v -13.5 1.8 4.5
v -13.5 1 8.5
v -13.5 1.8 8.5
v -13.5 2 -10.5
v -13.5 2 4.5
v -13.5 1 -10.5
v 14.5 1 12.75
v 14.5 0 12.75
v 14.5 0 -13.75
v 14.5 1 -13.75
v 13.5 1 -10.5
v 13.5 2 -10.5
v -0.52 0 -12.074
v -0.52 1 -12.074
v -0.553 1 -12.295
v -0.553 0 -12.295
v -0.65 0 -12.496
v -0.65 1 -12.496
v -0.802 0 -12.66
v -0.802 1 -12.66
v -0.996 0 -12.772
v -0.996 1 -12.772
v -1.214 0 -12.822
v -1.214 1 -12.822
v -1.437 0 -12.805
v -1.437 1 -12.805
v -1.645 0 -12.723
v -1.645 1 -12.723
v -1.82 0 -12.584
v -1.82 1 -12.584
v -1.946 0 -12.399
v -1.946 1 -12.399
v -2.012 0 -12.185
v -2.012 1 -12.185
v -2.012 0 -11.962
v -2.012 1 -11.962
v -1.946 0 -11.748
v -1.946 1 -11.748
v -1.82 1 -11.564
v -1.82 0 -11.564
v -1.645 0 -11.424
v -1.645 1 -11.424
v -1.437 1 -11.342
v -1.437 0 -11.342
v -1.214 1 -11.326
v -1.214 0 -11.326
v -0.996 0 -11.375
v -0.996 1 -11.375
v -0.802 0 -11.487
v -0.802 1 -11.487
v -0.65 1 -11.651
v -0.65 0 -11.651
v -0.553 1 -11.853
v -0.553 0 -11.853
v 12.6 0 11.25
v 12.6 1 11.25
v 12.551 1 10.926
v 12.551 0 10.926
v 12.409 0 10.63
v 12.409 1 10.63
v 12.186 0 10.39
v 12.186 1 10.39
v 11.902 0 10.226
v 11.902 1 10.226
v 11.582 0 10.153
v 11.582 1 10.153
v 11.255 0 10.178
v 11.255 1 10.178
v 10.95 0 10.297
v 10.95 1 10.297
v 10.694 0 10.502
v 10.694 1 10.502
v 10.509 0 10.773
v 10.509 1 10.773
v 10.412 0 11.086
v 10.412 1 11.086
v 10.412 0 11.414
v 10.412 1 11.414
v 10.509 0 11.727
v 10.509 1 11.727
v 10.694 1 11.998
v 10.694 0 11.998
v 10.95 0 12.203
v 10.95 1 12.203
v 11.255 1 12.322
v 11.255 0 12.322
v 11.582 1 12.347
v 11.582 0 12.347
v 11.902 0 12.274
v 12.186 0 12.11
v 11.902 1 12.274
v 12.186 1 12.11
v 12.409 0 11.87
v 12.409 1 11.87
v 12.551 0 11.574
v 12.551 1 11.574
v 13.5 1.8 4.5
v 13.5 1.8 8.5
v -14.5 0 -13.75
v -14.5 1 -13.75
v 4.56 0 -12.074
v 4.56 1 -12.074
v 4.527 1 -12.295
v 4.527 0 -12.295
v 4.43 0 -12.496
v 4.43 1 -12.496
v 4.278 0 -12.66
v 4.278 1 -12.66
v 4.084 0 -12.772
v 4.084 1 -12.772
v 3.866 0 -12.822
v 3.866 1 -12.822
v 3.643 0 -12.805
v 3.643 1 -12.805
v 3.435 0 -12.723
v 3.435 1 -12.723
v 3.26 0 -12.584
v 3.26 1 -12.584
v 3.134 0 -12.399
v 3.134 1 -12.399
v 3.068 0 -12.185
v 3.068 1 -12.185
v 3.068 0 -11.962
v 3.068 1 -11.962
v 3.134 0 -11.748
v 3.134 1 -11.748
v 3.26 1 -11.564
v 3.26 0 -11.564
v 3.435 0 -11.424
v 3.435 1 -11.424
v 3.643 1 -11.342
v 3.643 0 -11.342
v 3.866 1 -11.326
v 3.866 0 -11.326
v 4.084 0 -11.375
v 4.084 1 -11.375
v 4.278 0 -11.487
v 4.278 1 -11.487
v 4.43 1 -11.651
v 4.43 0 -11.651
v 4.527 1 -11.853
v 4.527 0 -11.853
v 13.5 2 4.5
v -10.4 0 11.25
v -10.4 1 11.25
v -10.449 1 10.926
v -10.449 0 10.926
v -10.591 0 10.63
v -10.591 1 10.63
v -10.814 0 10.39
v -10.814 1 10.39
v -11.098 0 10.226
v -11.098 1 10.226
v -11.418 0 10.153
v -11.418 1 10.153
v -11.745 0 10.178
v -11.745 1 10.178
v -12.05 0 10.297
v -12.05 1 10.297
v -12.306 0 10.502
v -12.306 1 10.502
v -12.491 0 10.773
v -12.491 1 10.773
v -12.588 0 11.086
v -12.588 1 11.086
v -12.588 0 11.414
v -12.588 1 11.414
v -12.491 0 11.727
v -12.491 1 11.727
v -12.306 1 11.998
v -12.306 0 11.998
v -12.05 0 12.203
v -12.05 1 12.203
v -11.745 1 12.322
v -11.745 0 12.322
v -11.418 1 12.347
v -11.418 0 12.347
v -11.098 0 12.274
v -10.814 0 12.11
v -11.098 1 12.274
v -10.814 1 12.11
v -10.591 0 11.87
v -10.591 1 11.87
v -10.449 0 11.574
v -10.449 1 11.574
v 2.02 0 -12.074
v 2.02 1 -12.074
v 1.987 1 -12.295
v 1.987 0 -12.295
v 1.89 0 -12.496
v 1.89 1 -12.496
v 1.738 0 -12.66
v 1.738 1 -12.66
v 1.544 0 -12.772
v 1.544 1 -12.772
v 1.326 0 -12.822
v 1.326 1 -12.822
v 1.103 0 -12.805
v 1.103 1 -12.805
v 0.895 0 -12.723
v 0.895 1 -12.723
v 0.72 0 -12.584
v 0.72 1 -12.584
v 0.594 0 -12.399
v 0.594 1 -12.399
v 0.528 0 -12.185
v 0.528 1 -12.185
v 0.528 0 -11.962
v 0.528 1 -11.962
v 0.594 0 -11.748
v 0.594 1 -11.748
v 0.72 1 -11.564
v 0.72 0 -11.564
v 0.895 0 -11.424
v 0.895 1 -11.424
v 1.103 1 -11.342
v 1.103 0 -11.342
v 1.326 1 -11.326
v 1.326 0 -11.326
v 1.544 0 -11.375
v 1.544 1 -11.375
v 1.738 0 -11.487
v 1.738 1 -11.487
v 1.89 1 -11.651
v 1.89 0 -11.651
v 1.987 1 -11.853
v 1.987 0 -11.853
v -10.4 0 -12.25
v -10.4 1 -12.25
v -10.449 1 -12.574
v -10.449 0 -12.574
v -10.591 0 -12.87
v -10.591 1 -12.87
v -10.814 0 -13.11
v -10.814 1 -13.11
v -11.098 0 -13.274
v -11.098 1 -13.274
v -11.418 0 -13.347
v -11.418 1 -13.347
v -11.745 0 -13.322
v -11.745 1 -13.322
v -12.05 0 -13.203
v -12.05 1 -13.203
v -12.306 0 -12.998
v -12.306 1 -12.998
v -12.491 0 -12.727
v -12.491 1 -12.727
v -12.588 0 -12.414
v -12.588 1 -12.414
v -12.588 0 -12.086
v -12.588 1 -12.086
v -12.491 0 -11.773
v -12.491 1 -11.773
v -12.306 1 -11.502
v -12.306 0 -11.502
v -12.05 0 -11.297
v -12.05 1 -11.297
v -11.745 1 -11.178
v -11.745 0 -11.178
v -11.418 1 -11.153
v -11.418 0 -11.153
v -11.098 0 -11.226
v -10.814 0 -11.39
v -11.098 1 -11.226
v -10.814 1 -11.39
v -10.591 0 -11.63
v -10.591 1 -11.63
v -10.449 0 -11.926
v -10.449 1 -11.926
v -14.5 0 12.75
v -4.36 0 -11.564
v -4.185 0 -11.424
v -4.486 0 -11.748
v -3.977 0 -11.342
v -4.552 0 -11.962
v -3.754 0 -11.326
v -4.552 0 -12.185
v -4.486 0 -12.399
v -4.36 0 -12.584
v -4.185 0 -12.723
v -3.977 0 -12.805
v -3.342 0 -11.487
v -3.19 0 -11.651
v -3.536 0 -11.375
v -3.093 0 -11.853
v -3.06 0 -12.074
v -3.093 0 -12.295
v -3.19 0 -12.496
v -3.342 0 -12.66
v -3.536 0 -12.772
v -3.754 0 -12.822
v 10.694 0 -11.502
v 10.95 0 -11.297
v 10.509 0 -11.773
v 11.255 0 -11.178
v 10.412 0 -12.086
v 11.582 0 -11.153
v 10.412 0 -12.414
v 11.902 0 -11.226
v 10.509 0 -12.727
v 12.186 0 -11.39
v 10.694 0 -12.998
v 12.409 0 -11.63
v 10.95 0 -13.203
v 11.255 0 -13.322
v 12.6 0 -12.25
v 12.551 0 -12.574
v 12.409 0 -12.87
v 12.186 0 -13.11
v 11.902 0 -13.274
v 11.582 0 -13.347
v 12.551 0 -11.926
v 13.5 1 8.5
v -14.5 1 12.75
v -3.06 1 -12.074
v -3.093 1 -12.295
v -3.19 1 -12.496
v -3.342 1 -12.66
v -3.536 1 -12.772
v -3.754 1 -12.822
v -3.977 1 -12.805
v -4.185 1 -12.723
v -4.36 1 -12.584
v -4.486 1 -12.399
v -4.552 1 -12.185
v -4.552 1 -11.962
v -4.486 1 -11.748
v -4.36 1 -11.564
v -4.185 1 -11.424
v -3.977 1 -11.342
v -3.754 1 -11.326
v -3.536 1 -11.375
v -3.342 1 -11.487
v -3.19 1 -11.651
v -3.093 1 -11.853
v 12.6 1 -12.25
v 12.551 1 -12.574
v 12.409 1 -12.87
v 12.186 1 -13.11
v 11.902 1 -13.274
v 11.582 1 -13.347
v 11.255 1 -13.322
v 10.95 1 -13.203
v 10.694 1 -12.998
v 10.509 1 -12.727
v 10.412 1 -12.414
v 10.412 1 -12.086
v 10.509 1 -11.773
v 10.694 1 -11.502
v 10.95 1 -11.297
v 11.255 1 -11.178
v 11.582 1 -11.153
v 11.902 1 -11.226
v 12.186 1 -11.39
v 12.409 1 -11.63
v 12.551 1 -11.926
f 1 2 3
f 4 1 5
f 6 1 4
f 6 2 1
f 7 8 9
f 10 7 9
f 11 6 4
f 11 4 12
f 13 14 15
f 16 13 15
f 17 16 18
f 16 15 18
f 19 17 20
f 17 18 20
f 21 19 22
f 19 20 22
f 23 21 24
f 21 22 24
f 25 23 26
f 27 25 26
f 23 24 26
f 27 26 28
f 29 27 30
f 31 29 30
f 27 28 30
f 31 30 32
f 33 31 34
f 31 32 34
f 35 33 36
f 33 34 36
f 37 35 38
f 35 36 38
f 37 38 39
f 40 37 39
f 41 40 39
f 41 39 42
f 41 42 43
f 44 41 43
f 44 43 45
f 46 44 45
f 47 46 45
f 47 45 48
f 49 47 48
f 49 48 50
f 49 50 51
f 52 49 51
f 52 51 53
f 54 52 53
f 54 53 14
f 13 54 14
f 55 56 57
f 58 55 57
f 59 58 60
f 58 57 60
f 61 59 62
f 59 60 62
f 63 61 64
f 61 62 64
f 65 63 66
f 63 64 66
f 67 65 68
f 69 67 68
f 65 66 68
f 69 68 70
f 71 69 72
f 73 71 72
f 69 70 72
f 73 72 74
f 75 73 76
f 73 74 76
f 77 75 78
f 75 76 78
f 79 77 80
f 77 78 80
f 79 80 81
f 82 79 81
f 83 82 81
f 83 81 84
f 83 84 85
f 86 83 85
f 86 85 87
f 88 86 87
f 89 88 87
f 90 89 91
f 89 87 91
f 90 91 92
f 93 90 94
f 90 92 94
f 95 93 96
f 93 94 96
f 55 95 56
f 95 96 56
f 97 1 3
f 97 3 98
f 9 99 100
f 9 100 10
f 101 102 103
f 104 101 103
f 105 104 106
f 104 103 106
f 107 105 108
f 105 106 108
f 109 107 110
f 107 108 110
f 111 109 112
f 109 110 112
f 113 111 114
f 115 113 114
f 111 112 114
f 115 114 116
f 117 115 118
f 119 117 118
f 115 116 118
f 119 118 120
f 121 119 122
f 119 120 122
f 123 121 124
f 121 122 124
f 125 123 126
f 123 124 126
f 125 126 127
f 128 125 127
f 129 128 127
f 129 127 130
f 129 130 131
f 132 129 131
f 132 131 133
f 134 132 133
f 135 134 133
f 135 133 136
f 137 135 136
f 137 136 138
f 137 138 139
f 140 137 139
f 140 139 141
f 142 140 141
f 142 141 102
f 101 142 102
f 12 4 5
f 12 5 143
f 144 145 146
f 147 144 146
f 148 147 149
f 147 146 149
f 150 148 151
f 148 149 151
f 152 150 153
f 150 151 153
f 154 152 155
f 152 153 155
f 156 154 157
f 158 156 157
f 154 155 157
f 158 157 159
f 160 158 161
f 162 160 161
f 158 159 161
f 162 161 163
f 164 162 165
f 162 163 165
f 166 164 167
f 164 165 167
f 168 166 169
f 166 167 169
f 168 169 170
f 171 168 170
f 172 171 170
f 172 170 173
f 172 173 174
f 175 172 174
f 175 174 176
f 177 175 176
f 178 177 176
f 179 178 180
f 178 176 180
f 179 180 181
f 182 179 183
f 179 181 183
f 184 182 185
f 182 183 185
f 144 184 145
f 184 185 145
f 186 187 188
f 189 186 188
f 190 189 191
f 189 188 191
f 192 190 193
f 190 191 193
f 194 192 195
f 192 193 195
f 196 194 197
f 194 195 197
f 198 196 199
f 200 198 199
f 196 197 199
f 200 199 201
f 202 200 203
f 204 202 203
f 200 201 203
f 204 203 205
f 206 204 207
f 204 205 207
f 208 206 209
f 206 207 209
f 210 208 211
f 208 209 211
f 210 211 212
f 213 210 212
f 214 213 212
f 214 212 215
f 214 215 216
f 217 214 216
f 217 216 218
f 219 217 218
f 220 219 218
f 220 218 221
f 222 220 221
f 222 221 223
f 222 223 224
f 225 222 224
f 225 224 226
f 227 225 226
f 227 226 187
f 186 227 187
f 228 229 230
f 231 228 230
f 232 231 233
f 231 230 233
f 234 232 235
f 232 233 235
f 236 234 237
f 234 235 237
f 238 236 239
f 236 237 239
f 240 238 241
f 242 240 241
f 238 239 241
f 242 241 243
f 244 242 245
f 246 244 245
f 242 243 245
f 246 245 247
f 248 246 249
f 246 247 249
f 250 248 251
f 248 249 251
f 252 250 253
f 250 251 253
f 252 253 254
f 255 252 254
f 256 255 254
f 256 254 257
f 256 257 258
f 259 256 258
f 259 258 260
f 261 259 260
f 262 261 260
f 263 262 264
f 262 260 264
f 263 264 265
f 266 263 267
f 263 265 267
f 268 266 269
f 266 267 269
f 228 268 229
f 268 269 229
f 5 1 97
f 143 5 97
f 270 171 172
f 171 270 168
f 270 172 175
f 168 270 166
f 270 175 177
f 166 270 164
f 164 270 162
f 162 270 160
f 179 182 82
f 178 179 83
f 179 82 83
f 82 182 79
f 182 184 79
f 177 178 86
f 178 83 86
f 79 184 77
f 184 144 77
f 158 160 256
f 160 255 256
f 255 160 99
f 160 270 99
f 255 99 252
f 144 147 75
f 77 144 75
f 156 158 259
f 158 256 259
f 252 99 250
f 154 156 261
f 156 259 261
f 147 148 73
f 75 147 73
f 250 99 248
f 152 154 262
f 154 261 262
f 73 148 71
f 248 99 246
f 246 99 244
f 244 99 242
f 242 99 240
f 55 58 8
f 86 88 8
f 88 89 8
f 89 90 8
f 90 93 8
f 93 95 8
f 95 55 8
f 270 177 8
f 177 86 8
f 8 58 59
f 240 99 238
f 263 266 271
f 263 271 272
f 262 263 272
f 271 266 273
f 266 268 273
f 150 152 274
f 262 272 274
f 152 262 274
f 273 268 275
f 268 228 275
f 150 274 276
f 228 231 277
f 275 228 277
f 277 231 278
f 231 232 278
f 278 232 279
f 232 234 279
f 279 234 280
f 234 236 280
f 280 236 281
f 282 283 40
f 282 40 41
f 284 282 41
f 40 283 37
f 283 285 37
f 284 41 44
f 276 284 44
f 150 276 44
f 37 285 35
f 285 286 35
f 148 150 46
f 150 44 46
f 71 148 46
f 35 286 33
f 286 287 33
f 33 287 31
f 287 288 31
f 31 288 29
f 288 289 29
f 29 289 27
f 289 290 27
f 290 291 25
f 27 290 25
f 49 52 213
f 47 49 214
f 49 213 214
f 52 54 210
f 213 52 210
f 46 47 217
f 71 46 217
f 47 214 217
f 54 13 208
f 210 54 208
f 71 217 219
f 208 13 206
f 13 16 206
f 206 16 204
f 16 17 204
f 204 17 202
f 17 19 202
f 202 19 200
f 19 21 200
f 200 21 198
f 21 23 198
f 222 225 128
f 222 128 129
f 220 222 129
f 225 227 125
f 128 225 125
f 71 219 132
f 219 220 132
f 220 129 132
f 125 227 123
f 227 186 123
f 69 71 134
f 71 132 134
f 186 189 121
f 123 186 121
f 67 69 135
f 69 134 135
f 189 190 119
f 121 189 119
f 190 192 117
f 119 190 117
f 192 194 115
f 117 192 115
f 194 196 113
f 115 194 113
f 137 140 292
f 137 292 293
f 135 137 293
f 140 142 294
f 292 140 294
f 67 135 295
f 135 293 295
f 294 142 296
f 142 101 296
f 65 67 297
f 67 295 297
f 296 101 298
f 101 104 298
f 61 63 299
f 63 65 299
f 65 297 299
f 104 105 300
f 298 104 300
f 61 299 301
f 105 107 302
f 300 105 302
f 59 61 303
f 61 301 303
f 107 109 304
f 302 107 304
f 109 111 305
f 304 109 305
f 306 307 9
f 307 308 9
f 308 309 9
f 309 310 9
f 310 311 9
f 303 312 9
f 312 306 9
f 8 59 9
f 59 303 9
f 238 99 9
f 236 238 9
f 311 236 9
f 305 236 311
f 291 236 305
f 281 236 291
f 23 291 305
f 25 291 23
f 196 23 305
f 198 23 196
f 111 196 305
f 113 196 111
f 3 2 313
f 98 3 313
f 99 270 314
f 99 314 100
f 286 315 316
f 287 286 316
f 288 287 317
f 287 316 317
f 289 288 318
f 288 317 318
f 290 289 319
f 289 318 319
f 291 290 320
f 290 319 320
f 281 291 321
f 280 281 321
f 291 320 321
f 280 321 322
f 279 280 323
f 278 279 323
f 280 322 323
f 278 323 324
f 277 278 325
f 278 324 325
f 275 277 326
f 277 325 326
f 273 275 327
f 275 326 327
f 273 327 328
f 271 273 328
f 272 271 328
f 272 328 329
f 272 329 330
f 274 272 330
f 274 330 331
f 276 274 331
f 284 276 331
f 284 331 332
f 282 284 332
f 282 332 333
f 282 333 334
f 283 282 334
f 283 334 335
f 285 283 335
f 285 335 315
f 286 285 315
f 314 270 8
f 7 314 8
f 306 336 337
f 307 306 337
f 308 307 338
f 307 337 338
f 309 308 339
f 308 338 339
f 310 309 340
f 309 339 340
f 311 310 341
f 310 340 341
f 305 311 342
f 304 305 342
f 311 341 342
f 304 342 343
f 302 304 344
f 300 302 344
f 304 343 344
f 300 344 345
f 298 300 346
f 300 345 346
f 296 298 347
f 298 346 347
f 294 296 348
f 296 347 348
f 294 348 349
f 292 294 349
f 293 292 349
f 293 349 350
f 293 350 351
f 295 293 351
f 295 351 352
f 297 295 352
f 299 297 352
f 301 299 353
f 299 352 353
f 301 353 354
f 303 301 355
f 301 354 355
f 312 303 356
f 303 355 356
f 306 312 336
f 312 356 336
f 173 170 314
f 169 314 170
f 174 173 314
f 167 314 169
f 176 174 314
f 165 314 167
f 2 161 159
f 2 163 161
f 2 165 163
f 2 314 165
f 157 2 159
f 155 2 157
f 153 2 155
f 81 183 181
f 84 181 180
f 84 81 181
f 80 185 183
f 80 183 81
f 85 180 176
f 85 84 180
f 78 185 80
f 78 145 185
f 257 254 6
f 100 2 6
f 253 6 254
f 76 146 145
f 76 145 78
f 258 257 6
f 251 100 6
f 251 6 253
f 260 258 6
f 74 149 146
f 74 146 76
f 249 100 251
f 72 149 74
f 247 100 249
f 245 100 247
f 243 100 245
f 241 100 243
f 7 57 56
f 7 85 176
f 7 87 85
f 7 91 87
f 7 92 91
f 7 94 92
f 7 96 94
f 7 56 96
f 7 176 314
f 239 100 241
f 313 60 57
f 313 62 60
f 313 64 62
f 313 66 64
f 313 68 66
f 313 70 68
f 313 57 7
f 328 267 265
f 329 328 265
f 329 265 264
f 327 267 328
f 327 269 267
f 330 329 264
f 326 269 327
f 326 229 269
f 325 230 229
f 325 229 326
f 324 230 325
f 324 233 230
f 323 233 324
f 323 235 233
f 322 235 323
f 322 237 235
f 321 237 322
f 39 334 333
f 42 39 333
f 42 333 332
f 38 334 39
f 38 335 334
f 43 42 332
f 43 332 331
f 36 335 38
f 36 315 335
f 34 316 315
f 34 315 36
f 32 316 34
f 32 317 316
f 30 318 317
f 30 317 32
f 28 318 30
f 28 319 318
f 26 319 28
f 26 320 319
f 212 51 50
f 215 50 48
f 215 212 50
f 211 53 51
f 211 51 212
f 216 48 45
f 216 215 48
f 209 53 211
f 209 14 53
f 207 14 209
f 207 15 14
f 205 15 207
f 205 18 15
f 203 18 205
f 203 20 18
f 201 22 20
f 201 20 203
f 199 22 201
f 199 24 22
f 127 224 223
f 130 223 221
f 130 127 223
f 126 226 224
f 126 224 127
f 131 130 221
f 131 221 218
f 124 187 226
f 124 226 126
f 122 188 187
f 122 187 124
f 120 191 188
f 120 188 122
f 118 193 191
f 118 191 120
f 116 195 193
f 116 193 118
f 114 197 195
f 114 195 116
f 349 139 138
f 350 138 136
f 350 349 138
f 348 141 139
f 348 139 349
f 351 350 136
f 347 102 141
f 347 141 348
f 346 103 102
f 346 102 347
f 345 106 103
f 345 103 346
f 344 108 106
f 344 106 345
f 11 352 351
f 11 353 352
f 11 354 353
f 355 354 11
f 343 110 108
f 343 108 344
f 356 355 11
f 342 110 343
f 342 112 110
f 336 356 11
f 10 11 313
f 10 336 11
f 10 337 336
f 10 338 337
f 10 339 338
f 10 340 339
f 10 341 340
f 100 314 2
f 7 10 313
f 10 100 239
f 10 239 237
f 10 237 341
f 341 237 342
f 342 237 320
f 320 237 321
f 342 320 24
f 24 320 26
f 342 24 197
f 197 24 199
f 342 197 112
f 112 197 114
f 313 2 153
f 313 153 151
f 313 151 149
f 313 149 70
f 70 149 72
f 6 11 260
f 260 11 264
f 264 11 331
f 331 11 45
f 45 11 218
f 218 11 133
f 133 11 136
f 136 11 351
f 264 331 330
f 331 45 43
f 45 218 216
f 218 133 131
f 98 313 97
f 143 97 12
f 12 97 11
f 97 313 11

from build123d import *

# Parameters (mm, degrees)
SKETCH1_W           = 29
SKETCH1_H           = 26.5
BOSS_EXTRUDE1_DEPTH = 1
SKETCH2_R           = 1.1
CUT_EXTRUDE1_DEPTH  = 1
SKETCH3_W           = 27
SKETCH3_H           = 15
BOSS_EXTRUDE2_DEPTH = 1
SKETCH4_W           = 27
SKETCH4_H           = 19
BOSS_EXTRUDE3_DEPTH = 0.8
SKETCH5_R           = 0.75
CUT_EXTRUDE2_DEPTH  = 10.8


with BuildPart() as part:
    # Sketch1 → Boss-Extrude1 (new body)
    with BuildSketch(Plane(origin=(0, 0, 0), x_dir=(1, 0, 0), z_dir=(0, 1, 0))):
        with Locations((0, 0.5)):
            Rectangle(SKETCH1_W, SKETCH1_H)
    extrude(amount=BOSS_EXTRUDE1_DEPTH)

    # Sketch2 → Cut-Extrude1 (cut)
    with BuildSketch(Plane(origin=(0, 1, 0), x_dir=(1, 0, 0), z_dir=(0, 1, 0))):
        with Locations((-11.5, 12.25)):
            Circle(SKETCH2_R)
        with Locations((11.5, 12.25)):
            Circle(SKETCH2_R)
        with Locations((-11.5, -11.25)):
            Circle(SKETCH2_R)
        with Locations((11.5, -11.25)):
            Circle(SKETCH2_R)
    extrude(amount=-CUT_EXTRUDE1_DEPTH, mode=Mode.SUBTRACT)

    # Sketch3 → Boss-Extrude2 (add)
    with BuildSketch(Plane(origin=(0, 1, 0), x_dir=(1, 0, 0), z_dir=(0, 1, 0))):
        with Locations((0, 3)):
            Rectangle(SKETCH3_W, SKETCH3_H)
    extrude(amount=BOSS_EXTRUDE2_DEPTH)

    # Sketch4 → Boss-Extrude3 (add)
    with BuildSketch(Plane(origin=(0, 1, 0), x_dir=(1, 0, 0), z_dir=(0, 1, 0))):
        with Locations((0, 1)):
            Rectangle(SKETCH4_W, SKETCH4_H)
    extrude(amount=BOSS_EXTRUDE3_DEPTH)

    # Sketch5 → Cut-Extrude2 (cut)
    with BuildSketch(Plane(origin=(0, 1, 0), x_dir=(1, 0, 0), z_dir=(0, 1, 0))):
        with Locations((-1.27, 12.07364825)):
            Circle(SKETCH5_R)
        with Locations((1.27, 12.07364825)):
            Circle(SKETCH5_R)
        with Locations((3.81, 12.07364825)):
            Circle(SKETCH5_R)
        with Locations((-3.81, 12.07364825)):
            Circle(SKETCH5_R)
    extrude(amount=-CUT_EXTRUDE2_DEPTH, mode=Mode.SUBTRACT)


solid = part.part
